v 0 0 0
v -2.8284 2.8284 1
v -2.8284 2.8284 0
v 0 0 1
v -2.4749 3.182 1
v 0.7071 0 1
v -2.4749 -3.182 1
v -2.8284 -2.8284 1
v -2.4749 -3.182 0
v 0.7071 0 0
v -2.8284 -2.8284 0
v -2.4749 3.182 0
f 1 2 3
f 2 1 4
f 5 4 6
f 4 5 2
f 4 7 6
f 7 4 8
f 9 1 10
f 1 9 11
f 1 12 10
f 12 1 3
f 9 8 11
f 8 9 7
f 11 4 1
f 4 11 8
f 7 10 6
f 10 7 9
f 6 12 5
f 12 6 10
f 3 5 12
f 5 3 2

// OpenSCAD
rotate([0,0,45]){
    translate([-4,-0.5,0])
{
    cube([4,0.5,1]);
}
translate([0,-0.5,0])
{
    cube([0.5,4.5,1]);
}
}
